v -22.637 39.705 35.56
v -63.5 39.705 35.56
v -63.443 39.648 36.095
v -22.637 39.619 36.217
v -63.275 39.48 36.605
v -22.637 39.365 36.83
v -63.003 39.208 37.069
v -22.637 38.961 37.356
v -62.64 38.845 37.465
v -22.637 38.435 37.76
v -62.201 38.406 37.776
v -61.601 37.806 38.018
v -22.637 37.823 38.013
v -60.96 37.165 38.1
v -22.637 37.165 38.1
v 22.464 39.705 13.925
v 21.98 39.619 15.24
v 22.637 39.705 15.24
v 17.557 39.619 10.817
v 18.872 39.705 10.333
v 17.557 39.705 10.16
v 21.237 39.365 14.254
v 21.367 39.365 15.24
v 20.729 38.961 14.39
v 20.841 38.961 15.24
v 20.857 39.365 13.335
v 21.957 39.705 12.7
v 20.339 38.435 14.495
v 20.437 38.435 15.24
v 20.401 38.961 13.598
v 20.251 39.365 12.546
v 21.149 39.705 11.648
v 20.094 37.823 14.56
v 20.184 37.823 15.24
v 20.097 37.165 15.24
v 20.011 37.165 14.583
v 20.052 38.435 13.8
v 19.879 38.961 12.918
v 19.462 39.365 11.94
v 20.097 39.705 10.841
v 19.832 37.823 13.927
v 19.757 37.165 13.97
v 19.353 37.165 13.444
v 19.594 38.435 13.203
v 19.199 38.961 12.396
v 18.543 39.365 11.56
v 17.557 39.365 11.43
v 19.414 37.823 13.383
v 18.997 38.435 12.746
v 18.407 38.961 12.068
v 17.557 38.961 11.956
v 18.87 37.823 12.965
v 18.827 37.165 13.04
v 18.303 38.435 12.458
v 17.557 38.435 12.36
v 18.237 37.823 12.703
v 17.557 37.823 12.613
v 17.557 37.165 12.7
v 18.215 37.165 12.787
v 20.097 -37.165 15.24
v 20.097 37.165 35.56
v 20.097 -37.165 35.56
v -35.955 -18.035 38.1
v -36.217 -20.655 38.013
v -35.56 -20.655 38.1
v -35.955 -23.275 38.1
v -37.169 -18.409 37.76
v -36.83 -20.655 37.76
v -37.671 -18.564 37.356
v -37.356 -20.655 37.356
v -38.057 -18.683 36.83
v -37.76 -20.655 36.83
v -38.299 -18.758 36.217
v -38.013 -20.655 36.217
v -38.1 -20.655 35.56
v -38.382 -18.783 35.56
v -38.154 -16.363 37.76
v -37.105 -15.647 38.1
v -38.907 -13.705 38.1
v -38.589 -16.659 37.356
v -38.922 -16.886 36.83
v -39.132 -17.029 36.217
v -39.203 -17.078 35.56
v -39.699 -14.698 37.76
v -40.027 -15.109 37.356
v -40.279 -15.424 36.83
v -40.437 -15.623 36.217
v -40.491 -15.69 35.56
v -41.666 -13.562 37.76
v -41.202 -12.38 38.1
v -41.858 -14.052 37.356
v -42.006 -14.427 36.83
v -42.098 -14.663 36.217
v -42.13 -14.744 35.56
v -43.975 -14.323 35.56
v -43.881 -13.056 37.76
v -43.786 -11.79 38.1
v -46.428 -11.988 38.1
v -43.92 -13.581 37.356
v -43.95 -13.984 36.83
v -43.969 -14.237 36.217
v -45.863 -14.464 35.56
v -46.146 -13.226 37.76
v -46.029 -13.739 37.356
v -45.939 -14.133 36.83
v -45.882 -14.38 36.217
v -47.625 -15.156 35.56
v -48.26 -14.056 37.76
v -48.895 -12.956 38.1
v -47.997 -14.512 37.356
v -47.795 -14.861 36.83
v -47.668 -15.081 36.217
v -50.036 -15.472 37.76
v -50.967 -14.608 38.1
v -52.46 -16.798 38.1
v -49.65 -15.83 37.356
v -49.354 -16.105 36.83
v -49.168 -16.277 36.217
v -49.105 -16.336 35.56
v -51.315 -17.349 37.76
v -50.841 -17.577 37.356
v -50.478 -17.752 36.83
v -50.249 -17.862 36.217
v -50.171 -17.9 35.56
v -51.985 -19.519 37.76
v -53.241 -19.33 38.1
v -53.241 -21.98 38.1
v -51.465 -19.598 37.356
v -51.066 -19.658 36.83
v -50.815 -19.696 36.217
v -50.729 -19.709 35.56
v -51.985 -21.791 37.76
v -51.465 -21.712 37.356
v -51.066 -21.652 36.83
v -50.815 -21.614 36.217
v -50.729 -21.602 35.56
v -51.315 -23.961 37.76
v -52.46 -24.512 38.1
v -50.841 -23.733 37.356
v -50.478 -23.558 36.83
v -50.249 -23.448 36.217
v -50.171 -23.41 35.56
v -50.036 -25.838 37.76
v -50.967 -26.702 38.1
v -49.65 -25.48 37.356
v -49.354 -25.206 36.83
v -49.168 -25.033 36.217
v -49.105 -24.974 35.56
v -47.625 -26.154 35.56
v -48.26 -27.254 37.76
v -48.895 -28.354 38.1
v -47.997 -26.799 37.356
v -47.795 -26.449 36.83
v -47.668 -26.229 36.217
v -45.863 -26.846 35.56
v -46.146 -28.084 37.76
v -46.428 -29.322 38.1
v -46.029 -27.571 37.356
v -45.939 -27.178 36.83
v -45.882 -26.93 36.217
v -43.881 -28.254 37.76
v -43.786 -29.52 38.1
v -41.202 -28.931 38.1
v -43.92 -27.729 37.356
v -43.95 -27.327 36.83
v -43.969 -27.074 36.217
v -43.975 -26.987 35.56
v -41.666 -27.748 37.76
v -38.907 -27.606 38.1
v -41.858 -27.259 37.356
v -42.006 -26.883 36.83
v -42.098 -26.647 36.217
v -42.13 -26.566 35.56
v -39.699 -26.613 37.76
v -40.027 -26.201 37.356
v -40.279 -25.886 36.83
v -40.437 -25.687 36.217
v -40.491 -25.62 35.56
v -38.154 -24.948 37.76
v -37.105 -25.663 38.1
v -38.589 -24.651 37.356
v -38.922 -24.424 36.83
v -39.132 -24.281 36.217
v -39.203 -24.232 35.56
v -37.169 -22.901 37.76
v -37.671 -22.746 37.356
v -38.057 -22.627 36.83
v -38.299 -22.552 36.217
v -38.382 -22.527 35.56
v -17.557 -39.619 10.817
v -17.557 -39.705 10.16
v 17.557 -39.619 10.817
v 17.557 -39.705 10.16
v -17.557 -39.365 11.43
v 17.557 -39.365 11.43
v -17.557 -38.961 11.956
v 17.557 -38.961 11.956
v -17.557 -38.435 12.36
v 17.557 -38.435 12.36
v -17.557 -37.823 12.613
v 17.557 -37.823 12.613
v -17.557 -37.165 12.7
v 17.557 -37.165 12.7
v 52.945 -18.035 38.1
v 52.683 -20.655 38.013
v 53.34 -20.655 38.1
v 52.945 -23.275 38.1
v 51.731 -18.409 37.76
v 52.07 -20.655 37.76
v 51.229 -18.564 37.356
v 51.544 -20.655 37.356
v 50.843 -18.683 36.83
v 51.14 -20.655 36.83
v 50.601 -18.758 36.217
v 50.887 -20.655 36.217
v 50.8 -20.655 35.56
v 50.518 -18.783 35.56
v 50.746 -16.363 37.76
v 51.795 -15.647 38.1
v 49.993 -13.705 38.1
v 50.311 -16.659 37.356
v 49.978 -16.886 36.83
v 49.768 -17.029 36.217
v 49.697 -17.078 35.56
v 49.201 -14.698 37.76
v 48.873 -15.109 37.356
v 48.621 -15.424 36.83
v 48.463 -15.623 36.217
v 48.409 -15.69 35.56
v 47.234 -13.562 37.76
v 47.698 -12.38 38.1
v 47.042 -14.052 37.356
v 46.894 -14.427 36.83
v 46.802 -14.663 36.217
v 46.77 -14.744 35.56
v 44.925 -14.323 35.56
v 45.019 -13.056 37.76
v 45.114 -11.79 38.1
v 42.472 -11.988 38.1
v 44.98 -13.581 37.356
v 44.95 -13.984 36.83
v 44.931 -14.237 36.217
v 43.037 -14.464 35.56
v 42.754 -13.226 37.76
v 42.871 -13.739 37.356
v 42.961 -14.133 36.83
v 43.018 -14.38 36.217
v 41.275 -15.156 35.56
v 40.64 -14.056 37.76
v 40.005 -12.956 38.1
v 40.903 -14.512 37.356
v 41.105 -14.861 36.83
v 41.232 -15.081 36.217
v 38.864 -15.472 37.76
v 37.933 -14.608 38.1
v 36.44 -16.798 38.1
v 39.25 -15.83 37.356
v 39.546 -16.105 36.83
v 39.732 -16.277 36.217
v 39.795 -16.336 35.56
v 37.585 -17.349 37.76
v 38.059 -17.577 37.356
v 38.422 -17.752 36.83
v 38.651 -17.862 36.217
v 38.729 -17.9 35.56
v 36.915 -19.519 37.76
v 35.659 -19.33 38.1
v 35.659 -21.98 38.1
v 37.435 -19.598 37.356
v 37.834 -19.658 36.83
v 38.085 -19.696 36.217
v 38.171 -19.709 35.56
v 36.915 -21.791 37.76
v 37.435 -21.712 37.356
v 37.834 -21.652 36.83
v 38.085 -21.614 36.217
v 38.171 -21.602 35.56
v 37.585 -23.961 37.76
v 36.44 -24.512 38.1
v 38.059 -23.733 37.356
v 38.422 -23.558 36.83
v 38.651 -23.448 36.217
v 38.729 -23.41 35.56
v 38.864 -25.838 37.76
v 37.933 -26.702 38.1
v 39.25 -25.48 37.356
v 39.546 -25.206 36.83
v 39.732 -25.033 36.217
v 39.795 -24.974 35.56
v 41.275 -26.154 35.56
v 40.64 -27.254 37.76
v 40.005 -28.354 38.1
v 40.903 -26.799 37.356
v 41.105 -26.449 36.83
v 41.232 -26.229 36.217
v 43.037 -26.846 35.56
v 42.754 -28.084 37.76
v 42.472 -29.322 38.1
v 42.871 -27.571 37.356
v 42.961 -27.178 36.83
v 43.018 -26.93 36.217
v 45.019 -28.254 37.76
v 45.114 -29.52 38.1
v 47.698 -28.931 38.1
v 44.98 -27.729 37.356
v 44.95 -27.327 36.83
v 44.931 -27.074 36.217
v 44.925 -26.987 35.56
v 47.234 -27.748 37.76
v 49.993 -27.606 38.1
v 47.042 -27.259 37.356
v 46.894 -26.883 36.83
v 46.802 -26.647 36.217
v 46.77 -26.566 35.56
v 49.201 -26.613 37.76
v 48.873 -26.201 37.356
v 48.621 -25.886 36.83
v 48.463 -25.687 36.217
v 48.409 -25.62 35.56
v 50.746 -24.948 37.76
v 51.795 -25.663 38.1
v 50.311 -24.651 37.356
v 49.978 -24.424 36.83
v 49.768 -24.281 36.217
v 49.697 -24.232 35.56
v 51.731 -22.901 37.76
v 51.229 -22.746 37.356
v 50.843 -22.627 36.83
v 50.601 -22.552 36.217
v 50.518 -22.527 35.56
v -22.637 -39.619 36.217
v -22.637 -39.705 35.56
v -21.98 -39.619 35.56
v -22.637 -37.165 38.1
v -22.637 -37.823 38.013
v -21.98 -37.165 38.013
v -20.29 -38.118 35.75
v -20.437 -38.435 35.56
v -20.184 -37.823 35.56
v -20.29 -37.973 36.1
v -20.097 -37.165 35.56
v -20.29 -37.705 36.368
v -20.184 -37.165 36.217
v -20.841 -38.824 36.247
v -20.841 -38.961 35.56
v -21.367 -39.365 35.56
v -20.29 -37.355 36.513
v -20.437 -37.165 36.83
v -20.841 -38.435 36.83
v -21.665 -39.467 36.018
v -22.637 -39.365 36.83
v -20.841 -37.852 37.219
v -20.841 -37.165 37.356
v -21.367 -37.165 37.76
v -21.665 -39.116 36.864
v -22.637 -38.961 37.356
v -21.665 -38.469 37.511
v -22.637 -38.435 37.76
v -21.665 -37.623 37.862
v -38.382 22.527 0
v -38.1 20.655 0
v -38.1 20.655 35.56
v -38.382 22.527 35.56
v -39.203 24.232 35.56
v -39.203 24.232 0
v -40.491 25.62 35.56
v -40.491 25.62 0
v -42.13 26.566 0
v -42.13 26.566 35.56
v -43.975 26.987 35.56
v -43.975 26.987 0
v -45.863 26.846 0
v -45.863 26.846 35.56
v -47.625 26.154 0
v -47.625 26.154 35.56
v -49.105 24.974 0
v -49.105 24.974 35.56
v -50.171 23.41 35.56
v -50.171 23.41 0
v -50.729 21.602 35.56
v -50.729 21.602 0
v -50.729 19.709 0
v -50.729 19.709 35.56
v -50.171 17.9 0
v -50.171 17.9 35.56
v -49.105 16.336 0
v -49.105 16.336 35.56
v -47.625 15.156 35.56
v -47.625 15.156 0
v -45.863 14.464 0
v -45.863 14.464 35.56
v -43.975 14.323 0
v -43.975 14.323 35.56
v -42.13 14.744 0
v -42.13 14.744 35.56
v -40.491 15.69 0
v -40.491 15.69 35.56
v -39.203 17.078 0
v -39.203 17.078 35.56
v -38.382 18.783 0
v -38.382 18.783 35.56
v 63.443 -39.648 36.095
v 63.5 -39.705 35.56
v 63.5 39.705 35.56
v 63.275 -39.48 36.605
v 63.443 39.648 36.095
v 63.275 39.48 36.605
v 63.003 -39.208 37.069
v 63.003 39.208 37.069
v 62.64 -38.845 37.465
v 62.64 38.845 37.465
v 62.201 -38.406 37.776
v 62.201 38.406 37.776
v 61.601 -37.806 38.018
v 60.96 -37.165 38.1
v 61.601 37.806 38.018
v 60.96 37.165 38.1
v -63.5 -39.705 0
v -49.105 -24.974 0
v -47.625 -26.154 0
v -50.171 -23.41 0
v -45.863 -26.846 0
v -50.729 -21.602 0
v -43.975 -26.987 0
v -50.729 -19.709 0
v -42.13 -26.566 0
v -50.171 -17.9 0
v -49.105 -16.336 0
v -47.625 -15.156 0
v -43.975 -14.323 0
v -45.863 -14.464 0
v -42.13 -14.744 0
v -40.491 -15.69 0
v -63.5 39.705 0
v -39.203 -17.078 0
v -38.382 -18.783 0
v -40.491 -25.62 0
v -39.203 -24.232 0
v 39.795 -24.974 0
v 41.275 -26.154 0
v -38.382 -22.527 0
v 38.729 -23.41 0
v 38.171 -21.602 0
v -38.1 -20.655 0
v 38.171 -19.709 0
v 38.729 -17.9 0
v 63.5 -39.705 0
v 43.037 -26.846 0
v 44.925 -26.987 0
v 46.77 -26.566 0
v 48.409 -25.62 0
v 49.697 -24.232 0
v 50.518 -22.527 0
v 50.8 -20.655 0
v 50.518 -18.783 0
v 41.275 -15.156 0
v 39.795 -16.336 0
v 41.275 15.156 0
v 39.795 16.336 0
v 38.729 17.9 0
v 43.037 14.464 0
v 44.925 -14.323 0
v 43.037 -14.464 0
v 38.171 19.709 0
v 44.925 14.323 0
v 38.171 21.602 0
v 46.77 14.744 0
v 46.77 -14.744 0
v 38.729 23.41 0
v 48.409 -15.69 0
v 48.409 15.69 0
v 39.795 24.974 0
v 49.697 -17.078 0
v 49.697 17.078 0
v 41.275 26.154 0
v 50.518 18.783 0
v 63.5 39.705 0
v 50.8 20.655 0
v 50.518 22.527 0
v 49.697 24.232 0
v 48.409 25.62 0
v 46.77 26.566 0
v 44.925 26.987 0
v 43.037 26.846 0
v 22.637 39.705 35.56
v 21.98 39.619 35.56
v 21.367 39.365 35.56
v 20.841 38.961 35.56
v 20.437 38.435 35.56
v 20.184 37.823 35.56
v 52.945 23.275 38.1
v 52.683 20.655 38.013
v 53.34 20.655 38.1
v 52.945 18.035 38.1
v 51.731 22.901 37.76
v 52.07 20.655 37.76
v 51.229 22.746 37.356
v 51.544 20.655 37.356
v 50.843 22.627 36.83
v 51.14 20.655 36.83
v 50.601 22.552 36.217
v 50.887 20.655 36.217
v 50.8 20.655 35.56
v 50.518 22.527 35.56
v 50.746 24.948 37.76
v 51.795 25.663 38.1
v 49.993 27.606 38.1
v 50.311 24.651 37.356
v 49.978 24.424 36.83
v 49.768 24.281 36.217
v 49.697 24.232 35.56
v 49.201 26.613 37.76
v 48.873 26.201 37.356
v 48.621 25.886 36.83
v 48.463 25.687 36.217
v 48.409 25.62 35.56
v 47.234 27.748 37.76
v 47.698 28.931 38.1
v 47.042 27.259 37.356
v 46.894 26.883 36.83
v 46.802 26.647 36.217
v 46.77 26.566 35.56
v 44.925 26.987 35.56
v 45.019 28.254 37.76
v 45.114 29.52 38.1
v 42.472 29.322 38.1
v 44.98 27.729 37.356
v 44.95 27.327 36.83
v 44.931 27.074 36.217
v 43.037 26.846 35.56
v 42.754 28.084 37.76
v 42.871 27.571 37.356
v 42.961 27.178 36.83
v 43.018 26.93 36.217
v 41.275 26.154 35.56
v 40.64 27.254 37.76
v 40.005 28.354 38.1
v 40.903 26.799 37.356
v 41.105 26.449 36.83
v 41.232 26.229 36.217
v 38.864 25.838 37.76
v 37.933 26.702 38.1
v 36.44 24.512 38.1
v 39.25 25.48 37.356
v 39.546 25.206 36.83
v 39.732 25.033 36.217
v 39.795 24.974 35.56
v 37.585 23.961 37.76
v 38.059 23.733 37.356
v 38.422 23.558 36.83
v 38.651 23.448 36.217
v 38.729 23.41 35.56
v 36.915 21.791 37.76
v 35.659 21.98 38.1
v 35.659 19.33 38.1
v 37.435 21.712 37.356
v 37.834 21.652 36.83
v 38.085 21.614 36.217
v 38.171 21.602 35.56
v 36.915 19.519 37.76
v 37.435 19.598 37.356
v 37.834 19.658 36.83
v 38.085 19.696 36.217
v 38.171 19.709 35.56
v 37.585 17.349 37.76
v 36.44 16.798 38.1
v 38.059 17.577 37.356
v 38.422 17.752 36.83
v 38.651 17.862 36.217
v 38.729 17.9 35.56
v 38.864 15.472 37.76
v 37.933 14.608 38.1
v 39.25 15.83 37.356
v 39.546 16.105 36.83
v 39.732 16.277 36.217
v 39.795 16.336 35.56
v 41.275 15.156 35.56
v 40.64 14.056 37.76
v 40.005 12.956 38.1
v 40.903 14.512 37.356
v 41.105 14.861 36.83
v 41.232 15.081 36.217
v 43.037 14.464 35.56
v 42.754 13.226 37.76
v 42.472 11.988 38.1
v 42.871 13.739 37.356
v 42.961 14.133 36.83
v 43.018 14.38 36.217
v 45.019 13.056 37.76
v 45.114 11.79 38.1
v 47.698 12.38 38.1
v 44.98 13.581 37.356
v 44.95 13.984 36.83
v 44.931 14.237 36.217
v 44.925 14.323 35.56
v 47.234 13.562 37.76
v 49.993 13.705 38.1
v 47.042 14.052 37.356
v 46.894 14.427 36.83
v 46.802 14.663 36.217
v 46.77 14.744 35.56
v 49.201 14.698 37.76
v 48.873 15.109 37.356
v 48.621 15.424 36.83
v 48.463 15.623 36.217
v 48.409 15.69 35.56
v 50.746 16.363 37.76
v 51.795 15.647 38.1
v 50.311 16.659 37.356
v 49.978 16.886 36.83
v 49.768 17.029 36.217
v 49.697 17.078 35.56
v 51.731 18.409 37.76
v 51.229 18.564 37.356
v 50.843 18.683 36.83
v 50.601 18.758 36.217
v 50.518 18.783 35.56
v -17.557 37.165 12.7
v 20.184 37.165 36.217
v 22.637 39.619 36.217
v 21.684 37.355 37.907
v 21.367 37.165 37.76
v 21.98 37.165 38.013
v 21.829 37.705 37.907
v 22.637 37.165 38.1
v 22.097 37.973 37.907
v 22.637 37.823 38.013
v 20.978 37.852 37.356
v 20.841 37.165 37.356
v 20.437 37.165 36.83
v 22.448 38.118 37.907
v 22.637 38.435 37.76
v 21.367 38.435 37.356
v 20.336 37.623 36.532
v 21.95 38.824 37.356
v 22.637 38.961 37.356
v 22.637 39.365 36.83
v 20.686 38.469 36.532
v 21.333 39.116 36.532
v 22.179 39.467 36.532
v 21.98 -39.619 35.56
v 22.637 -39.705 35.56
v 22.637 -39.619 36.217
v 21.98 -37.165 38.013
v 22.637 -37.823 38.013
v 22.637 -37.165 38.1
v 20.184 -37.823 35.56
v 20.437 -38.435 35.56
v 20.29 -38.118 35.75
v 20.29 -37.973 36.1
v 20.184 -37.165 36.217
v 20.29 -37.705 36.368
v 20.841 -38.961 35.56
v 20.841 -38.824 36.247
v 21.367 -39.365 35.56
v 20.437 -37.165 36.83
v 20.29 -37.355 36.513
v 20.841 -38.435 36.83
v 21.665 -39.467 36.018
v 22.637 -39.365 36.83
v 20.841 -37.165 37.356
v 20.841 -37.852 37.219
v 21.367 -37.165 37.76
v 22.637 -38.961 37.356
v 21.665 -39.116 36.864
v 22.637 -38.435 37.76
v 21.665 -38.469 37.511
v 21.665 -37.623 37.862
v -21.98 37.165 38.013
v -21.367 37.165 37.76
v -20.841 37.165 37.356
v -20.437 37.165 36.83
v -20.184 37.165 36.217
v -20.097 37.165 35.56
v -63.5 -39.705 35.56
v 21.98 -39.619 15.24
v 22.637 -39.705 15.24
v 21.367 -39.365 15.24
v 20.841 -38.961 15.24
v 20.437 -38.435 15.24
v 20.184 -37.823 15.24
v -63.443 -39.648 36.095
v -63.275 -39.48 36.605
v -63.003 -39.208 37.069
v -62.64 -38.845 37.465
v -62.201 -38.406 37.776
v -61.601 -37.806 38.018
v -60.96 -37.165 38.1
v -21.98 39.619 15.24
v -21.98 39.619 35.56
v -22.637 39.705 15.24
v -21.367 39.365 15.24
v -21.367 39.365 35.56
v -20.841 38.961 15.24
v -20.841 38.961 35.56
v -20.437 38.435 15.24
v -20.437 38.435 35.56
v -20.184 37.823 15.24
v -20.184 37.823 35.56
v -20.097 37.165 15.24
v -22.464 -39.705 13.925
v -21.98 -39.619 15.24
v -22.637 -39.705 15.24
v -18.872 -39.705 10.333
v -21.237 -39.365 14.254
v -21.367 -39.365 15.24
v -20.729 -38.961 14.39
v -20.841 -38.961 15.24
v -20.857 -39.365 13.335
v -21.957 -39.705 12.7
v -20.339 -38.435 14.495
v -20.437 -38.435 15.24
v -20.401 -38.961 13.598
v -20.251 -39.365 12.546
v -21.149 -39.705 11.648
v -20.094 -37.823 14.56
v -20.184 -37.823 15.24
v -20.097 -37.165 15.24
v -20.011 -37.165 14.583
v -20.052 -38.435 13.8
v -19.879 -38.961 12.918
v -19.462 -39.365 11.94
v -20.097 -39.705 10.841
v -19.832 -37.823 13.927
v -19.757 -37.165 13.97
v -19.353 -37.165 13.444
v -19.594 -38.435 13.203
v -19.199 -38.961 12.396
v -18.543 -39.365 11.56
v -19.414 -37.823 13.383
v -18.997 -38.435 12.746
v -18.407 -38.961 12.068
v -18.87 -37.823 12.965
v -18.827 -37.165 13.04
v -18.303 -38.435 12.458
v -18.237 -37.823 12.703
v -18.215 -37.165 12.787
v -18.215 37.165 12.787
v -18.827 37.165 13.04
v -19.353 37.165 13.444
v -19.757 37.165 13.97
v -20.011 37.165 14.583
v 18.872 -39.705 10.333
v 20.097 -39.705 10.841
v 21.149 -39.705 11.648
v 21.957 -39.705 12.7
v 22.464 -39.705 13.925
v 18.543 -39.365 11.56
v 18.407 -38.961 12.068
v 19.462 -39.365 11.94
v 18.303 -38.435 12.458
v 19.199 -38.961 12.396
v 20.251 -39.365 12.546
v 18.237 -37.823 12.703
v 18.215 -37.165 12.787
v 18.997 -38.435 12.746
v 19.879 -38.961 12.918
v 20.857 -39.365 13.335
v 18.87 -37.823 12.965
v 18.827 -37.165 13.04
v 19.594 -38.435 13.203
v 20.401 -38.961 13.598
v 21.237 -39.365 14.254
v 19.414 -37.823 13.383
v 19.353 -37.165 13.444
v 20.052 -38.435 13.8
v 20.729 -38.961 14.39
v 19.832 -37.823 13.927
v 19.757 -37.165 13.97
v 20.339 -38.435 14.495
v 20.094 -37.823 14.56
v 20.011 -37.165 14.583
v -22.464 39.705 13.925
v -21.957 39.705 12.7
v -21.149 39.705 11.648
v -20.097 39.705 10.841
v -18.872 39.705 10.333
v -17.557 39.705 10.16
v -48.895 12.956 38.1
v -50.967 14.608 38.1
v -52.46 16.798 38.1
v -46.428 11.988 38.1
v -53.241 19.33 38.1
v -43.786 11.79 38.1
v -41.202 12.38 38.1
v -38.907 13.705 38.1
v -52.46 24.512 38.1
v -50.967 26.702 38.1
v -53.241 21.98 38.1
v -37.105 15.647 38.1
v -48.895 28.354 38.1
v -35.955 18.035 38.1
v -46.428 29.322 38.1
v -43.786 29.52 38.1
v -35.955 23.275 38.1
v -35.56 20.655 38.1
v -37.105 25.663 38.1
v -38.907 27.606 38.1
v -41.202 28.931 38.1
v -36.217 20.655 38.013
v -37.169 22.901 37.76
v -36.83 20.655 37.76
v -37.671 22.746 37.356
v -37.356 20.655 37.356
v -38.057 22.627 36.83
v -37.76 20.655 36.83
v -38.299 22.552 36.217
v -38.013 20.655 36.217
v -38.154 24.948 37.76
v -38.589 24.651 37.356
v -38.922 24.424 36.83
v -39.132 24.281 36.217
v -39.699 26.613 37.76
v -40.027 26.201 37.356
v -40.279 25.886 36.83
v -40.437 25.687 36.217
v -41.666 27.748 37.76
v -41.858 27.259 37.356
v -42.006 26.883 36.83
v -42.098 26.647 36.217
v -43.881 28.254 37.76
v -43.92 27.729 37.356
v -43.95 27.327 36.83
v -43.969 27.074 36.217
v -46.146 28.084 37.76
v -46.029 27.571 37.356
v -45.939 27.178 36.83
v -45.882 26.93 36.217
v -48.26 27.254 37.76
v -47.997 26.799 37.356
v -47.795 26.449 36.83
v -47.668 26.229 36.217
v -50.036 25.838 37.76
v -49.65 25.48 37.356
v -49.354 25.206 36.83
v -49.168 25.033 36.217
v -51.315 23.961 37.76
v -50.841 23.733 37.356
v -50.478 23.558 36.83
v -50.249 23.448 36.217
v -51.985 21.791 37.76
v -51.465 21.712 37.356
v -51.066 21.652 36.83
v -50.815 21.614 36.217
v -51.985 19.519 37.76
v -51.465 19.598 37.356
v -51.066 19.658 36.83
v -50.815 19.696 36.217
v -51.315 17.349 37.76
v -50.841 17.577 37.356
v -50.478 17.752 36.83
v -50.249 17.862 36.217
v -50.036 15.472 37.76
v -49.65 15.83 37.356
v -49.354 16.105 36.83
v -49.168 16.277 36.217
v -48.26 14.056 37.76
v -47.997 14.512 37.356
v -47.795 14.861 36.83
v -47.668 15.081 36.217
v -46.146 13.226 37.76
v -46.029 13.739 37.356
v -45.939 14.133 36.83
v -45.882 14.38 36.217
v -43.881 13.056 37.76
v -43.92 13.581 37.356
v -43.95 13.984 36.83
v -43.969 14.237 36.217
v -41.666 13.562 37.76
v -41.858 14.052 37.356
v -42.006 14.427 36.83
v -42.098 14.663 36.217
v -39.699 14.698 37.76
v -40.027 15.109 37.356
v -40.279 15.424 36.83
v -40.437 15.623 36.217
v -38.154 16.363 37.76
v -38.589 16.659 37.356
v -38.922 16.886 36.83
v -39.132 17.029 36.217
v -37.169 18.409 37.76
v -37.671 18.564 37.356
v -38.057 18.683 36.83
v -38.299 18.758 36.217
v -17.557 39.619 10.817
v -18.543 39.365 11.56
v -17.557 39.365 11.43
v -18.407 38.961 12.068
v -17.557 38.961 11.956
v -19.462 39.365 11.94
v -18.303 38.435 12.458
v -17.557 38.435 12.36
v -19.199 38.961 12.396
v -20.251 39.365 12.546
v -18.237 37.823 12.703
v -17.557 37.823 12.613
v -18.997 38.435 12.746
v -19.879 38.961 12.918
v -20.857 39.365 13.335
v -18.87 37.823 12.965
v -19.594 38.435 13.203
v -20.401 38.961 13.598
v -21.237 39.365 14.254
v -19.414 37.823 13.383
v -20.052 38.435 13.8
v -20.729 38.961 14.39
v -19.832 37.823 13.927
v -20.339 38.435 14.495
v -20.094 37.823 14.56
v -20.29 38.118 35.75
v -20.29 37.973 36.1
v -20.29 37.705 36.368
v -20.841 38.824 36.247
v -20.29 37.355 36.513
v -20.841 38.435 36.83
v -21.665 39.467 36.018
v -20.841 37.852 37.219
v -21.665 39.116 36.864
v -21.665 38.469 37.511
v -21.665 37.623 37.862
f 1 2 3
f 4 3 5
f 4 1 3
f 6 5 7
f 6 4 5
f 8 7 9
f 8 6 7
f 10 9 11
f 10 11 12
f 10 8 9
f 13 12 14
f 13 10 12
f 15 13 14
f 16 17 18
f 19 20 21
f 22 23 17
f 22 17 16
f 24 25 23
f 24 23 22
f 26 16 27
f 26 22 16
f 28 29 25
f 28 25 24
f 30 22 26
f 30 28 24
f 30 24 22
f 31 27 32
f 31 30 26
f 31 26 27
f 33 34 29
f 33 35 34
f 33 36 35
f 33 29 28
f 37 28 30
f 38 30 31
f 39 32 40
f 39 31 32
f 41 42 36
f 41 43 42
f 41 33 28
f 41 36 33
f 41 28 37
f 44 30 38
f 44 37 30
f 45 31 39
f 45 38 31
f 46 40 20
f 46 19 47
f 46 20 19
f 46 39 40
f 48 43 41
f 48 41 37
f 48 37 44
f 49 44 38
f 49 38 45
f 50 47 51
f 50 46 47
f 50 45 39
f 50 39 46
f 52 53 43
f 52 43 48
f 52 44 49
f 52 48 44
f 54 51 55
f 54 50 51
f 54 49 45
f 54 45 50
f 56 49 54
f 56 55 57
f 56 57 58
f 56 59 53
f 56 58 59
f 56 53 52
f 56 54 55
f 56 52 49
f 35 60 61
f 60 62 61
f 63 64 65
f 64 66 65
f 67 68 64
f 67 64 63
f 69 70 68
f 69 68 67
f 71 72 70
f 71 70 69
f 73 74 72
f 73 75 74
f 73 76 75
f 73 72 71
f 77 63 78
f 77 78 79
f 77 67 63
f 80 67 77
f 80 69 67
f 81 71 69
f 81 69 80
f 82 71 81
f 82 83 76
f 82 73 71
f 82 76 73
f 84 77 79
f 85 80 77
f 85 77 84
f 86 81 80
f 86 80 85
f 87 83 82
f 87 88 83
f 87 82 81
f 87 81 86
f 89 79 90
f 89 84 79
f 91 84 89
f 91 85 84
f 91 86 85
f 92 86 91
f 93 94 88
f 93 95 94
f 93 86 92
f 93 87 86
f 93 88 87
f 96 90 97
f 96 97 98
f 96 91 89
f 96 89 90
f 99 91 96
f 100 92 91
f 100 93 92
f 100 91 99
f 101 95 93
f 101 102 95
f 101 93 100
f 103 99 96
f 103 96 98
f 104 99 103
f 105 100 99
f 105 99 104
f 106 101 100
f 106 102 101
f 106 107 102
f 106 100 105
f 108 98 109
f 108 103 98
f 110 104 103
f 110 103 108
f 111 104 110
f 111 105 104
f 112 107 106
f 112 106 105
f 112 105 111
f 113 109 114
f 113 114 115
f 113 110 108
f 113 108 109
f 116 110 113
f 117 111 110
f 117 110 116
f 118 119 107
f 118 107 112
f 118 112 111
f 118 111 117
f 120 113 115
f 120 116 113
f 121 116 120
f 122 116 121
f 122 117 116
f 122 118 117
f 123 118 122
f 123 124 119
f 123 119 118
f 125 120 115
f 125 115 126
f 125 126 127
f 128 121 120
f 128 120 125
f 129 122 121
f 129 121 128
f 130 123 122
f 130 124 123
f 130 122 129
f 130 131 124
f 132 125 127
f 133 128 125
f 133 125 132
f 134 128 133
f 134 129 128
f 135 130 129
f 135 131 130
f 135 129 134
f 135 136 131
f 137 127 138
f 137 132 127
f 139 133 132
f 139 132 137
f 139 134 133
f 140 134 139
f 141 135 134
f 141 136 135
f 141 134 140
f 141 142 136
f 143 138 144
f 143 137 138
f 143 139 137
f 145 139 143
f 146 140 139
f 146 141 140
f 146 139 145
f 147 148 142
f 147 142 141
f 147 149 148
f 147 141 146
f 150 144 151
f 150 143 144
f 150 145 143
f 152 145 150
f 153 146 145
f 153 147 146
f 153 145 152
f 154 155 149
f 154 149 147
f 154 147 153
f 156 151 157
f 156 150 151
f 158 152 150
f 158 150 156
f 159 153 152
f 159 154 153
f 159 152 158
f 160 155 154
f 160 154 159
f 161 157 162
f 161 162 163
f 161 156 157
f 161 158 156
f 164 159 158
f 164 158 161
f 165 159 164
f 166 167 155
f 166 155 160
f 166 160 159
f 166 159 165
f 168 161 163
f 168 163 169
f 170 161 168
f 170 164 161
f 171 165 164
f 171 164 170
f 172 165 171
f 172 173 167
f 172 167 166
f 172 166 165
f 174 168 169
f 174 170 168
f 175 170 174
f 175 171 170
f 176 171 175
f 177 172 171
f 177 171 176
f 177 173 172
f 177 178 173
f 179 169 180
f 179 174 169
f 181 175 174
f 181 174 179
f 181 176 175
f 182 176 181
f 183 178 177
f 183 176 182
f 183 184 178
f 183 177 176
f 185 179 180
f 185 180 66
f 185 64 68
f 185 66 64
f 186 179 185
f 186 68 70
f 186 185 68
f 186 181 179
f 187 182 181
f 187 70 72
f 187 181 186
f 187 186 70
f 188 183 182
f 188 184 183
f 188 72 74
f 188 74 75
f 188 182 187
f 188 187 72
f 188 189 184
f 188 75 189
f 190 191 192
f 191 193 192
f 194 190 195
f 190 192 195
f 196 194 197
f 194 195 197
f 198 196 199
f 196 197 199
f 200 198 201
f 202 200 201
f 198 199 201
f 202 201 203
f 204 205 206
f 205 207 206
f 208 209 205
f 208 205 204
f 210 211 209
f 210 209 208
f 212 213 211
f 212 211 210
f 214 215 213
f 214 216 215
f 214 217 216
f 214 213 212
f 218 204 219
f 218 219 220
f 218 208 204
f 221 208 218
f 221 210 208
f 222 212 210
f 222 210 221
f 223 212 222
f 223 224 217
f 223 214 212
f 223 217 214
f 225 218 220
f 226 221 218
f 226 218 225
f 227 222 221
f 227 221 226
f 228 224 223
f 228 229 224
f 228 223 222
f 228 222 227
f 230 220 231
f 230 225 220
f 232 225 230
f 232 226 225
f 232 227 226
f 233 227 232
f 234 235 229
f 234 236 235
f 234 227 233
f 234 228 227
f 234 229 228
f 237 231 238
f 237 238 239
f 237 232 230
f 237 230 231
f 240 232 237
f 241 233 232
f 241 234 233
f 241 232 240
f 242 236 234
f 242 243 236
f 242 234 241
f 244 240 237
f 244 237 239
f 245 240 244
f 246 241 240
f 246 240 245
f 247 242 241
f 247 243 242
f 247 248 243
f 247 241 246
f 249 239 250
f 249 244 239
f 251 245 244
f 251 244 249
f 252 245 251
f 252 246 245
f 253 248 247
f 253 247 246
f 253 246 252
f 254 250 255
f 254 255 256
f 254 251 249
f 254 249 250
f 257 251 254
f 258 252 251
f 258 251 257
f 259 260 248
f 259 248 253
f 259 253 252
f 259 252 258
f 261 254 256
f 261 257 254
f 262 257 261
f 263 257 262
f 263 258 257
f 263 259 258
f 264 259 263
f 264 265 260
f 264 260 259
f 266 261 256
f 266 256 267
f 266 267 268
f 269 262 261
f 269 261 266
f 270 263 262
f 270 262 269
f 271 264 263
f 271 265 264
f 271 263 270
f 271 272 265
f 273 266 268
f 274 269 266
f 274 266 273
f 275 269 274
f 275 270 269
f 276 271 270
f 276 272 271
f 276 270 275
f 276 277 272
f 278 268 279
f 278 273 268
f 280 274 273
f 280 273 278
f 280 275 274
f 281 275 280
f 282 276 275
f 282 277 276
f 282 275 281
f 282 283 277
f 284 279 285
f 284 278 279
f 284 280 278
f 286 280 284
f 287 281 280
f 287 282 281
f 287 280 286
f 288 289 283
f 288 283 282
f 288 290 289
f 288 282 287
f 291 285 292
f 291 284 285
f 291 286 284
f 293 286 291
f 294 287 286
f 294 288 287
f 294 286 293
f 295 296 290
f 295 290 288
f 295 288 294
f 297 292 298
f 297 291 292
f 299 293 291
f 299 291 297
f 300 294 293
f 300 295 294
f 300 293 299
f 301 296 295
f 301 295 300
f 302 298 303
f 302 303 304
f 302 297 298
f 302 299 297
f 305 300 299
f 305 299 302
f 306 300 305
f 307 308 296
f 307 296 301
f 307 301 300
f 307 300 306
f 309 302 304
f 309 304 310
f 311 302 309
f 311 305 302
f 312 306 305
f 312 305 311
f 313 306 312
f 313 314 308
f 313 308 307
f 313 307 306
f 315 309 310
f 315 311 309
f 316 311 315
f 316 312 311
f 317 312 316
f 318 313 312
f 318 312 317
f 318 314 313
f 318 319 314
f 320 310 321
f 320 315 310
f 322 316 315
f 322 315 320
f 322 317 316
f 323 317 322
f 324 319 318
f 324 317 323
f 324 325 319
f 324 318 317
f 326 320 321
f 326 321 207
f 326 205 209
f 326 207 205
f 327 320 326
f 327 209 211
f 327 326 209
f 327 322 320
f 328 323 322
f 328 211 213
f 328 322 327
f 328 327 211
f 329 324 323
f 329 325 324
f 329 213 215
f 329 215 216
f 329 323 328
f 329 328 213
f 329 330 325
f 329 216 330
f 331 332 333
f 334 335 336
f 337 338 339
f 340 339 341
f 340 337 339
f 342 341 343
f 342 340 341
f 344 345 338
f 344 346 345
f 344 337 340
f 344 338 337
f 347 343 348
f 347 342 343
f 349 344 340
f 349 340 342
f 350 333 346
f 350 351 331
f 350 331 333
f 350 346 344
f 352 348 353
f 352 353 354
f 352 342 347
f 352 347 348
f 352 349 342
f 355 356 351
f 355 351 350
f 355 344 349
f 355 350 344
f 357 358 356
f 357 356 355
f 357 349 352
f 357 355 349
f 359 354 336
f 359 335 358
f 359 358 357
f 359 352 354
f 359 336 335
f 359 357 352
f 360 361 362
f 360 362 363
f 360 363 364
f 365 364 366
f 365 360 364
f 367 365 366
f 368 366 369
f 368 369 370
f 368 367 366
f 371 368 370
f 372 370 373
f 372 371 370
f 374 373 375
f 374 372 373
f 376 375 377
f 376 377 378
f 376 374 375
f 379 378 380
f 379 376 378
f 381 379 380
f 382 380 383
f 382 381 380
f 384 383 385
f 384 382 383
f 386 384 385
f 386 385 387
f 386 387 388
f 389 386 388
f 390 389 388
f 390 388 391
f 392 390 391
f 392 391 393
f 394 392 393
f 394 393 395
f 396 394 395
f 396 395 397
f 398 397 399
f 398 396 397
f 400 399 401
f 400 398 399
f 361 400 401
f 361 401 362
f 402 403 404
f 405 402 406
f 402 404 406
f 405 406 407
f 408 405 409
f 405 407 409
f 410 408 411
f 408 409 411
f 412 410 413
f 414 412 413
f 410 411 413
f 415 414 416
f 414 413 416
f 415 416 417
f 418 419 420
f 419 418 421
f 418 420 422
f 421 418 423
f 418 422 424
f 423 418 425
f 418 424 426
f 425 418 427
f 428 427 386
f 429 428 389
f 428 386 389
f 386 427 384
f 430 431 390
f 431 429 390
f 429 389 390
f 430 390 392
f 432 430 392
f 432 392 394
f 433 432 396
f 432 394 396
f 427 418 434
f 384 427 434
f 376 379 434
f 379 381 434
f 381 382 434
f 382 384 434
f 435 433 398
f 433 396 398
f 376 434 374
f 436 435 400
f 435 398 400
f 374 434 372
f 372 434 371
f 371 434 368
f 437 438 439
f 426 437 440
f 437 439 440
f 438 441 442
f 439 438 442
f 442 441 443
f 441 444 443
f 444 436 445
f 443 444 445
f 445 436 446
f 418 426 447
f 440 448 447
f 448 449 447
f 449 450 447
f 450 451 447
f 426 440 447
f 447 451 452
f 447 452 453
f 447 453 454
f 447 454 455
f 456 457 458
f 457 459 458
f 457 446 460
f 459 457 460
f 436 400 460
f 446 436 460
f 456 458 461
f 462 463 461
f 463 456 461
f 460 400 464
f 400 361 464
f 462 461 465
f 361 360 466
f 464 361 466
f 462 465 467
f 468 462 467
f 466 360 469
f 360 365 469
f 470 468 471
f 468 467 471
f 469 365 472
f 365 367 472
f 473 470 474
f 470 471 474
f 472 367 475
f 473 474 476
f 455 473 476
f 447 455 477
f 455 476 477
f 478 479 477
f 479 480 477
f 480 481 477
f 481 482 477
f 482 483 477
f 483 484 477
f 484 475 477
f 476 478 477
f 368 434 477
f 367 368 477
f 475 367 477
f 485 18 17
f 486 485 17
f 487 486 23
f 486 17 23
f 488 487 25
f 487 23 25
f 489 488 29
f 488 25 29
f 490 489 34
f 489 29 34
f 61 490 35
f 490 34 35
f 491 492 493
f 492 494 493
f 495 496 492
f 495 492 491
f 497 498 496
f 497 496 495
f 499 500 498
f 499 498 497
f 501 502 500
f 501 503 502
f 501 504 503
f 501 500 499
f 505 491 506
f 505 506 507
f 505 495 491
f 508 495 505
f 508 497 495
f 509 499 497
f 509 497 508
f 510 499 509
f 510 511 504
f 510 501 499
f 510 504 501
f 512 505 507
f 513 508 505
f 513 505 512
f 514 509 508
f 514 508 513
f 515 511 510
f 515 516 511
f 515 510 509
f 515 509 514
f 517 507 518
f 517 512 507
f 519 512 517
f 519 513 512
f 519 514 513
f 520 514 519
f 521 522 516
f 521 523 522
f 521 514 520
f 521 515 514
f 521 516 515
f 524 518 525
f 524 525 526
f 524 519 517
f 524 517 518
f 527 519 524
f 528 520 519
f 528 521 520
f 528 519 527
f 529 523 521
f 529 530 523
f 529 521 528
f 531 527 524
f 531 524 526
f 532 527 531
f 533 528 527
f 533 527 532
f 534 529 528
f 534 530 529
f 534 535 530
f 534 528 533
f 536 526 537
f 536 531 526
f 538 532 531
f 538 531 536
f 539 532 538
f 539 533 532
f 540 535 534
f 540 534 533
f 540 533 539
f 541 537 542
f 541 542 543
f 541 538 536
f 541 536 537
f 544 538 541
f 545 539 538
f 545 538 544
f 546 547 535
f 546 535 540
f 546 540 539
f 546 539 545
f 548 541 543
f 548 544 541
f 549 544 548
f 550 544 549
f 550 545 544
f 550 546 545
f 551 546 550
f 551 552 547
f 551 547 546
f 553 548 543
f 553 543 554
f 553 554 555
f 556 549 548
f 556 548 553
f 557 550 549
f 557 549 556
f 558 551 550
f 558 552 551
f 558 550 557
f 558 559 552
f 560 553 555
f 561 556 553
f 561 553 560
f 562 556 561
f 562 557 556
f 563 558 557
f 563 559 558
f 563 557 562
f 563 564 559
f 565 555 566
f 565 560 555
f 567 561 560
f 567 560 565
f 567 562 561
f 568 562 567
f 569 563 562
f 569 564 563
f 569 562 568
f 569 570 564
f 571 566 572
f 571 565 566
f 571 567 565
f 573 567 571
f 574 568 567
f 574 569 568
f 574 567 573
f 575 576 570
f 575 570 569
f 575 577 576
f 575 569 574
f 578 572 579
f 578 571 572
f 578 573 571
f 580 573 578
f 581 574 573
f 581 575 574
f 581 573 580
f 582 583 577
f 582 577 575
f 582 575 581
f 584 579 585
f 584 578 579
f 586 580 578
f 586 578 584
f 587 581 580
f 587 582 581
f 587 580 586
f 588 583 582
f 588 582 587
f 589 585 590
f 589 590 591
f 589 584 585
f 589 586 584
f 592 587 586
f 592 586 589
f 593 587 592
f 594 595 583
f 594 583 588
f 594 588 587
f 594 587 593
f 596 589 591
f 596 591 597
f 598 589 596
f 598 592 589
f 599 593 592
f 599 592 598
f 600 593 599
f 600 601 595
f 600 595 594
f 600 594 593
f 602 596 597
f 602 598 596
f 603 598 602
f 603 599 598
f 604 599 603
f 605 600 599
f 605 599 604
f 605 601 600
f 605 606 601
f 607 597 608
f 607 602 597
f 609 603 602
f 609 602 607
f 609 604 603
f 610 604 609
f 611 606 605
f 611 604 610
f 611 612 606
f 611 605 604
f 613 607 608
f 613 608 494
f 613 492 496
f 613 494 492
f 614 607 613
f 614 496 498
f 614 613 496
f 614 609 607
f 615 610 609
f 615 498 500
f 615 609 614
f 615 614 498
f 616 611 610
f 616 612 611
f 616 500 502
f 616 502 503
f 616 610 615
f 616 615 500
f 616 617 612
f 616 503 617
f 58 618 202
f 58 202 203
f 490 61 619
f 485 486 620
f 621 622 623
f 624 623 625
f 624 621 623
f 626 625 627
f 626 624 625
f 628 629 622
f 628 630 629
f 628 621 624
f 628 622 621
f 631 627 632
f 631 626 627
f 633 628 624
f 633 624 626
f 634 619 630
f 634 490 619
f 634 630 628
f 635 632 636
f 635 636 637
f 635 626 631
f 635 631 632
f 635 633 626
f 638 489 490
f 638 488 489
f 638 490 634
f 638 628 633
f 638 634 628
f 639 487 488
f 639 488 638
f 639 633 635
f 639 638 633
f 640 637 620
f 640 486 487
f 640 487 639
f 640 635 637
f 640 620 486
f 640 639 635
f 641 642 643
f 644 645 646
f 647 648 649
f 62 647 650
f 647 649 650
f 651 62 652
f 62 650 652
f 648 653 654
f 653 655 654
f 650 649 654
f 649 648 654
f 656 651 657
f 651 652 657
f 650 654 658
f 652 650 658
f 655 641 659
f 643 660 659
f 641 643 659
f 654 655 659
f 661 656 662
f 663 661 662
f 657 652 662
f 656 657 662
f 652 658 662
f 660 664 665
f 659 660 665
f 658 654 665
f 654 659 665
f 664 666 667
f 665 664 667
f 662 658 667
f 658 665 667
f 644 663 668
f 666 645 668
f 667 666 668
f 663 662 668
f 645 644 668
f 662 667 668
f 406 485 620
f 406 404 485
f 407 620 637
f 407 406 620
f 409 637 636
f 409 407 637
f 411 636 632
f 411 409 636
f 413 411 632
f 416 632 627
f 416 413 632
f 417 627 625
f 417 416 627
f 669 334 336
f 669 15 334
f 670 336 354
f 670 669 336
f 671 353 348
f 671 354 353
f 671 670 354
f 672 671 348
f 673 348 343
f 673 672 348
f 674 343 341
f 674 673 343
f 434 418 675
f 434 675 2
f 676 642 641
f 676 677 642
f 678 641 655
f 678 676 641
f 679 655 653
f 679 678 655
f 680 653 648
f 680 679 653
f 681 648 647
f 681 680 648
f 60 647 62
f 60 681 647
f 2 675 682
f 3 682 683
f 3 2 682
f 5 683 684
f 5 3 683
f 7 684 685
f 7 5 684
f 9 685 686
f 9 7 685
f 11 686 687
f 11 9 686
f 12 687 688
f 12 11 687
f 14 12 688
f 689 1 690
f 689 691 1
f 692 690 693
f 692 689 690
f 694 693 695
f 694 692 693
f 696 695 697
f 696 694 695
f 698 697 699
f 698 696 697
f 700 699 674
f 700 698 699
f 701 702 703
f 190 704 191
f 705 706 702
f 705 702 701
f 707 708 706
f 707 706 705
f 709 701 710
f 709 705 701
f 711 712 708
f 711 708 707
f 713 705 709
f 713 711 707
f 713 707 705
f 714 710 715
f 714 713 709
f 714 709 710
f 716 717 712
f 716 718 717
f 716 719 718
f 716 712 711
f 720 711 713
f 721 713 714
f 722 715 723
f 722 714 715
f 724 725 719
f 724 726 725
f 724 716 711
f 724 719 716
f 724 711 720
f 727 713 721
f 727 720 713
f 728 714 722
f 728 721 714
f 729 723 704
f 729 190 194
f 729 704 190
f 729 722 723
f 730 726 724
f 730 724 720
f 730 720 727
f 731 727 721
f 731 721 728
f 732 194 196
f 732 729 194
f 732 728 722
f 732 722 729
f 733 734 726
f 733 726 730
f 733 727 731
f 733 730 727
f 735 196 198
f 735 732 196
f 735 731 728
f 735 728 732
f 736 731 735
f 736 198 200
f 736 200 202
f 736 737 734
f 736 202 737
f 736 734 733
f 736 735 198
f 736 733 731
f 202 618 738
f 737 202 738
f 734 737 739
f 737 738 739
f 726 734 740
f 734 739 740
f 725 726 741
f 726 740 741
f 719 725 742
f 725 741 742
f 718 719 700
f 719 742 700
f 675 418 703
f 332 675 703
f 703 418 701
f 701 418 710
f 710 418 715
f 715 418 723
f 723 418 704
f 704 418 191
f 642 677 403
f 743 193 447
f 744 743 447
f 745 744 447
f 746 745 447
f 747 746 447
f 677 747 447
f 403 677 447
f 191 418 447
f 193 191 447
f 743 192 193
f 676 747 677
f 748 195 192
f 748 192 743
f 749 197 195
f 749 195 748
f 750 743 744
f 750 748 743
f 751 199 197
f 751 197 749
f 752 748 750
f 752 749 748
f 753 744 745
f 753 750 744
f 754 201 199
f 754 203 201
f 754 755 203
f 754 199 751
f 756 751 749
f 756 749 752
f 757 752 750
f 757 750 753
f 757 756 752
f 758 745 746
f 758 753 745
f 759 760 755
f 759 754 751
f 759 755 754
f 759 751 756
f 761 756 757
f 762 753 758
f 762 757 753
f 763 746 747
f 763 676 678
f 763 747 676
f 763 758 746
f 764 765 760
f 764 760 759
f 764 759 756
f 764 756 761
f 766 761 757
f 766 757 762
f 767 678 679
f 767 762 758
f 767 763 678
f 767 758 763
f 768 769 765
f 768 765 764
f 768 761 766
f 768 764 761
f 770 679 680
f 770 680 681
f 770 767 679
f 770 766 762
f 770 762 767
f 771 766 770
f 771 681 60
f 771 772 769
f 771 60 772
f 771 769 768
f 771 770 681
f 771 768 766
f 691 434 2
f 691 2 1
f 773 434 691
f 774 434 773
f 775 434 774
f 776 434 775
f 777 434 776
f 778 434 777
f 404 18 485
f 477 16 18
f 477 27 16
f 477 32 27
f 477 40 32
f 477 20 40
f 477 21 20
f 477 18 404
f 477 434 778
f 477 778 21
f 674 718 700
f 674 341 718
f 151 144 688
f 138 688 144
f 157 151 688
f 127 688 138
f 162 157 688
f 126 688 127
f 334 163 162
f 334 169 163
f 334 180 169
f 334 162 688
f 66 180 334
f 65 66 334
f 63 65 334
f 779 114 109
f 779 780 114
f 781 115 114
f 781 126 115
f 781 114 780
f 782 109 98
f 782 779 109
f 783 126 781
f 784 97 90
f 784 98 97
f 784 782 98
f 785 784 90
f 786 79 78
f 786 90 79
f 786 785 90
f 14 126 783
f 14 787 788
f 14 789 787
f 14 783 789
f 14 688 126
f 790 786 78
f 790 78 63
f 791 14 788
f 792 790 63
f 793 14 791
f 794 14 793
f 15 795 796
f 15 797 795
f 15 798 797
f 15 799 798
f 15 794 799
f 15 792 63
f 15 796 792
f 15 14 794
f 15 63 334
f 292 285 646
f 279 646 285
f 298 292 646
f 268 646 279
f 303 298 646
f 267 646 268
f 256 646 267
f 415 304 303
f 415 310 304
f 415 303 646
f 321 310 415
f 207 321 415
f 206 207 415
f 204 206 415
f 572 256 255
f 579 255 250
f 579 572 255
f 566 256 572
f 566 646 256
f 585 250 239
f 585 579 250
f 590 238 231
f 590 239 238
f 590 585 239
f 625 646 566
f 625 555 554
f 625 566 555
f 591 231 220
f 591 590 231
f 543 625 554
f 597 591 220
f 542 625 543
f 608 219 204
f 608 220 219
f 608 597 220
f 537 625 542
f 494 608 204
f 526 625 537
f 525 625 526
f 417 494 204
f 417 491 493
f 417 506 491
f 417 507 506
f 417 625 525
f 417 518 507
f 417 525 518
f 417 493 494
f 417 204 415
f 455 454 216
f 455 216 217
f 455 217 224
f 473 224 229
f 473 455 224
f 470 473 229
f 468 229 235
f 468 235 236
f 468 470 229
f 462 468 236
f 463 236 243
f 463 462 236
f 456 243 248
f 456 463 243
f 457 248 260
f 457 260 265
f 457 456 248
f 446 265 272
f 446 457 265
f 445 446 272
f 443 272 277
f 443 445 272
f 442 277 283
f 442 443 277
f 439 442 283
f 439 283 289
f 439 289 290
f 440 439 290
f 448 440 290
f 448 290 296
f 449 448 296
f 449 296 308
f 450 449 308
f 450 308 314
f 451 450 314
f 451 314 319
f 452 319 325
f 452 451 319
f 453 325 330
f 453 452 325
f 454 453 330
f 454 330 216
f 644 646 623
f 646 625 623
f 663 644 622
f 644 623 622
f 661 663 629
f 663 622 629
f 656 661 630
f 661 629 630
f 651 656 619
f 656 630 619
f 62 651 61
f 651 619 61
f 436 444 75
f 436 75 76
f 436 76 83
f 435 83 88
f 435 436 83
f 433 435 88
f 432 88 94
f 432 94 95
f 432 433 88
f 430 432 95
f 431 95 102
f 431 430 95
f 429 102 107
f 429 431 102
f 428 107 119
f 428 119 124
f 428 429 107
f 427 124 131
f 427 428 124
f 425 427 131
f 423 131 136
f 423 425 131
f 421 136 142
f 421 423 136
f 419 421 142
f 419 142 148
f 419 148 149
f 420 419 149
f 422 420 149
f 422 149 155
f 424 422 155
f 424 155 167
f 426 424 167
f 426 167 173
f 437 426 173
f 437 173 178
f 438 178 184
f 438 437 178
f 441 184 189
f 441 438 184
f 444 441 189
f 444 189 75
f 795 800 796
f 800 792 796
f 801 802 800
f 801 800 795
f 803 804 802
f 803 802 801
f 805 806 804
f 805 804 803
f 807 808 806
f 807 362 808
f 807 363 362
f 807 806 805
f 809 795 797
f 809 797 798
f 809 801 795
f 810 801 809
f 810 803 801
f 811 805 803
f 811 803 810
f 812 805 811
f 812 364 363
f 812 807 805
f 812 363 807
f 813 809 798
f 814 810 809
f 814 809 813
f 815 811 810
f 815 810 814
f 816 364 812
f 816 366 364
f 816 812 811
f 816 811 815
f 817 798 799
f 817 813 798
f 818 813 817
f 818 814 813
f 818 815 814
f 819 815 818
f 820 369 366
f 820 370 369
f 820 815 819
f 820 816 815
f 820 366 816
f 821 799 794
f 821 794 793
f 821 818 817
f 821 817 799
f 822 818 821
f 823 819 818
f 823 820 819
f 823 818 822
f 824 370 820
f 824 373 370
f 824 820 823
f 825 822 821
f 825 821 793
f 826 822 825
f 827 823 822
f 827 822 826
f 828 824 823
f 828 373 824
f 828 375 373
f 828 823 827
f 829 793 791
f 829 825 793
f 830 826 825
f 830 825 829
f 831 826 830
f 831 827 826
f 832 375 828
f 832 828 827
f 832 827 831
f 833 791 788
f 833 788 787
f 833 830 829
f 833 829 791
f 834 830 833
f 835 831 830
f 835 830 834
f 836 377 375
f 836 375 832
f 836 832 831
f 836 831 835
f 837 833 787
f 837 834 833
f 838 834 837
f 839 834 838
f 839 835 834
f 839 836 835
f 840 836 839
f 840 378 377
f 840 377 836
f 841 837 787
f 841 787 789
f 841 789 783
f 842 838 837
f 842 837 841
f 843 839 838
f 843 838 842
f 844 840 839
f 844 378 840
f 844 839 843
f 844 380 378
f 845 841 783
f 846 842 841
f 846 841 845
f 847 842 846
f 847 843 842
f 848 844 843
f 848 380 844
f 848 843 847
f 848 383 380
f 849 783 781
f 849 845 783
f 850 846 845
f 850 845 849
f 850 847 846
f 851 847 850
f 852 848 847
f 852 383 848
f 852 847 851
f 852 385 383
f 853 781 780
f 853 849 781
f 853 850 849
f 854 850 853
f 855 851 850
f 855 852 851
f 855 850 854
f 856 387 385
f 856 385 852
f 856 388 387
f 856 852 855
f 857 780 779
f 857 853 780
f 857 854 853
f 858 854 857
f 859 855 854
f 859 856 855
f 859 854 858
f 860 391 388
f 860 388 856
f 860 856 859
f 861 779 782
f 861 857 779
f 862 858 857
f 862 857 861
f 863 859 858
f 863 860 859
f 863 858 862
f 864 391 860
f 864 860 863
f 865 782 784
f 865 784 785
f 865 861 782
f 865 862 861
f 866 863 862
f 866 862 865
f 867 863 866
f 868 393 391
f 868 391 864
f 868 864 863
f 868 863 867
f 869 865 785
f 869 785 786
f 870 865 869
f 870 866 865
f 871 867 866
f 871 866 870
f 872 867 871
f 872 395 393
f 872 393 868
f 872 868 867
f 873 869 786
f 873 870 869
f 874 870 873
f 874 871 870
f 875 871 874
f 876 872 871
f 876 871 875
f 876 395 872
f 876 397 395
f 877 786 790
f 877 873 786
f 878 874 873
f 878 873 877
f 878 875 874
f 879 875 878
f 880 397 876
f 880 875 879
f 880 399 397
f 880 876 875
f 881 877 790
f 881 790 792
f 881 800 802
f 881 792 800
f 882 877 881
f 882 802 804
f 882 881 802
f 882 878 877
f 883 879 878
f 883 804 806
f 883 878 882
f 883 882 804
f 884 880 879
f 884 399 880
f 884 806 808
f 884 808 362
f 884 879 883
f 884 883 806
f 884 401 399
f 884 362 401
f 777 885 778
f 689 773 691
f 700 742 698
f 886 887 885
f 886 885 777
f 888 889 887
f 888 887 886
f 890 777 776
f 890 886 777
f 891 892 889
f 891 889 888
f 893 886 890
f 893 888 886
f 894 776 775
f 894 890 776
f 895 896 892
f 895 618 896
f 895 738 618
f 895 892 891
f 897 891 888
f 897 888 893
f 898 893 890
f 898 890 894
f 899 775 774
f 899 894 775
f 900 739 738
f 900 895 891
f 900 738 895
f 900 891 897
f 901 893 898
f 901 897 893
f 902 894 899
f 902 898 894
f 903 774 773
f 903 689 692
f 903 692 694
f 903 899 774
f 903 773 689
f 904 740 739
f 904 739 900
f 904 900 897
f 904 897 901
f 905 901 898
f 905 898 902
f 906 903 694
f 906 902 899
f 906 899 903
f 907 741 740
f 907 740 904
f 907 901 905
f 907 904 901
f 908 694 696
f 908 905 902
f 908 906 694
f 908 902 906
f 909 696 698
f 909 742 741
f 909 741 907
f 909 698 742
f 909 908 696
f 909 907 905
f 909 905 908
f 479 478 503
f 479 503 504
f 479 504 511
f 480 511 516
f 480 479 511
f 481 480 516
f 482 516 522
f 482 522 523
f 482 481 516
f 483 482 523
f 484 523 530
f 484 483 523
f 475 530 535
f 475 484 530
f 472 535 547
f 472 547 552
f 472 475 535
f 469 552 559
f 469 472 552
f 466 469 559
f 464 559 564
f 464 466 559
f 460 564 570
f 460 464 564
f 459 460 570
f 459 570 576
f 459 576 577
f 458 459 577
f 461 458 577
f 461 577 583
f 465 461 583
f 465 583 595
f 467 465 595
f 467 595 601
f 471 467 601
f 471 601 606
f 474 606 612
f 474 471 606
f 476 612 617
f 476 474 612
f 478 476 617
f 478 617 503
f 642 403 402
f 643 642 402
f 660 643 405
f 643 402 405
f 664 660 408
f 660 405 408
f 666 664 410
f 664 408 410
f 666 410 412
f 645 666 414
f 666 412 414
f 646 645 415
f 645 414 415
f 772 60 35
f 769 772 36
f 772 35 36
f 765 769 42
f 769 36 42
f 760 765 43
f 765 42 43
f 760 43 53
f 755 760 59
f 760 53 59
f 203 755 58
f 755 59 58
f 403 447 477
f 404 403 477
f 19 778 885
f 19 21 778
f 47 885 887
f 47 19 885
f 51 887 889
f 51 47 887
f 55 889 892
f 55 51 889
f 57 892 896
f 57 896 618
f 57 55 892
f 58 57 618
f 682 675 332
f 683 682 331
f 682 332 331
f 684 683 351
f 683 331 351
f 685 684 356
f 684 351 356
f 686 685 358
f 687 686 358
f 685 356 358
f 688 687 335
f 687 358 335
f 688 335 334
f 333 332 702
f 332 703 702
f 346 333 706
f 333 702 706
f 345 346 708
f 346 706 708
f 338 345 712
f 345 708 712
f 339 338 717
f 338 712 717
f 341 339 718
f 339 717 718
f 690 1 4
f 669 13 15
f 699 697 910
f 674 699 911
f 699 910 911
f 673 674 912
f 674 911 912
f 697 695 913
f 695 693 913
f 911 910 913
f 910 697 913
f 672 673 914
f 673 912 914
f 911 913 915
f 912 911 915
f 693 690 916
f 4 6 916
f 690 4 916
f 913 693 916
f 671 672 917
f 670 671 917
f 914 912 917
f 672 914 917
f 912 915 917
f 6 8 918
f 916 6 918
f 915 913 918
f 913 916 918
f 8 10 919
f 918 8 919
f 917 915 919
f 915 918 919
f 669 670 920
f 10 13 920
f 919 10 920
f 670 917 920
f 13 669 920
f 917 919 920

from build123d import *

# Parameters (mm, degrees)
SKETCH1_W           = 127
SKETCH1_H           = 79.410199556
SKETCH1_R           = 6.35
BOSS_EXTRUDE1_DEPTH = 38.1
SKETCH3_W           = 40.194306858
SKETCH3_H           = 79.410199556
CUT_EXTRUDE1_DEPTH  = 25.4
FILLET1_R           = 2.54
FILLET2_R           = 2.54


with BuildPart() as part:
    # Sketch1 → Boss-Extrude1 (new body)
    with BuildSketch(Plane.XY):
        Rectangle(SKETCH1_W, SKETCH1_H)
        with Locations((-44.45, 20.655099778)):
            Circle(SKETCH1_R, mode=Mode.SUBTRACT)
        with Locations((44.45, 20.655099778)):
            Circle(SKETCH1_R, mode=Mode.SUBTRACT)
        with Locations((44.45, -20.655099778)):
            Circle(SKETCH1_R, mode=Mode.SUBTRACT)
        with Locations((-44.45, -20.655099778)):
            Circle(SKETCH1_R, mode=Mode.SUBTRACT)
    extrude(amount=BOSS_EXTRUDE1_DEPTH)

    # Sketch3 → Cut-Extrude1 (cut)
    with BuildSketch(Plane.XY.offset(38.1)):
        Rectangle(SKETCH3_W, SKETCH3_H)
    extrude(amount=-CUT_EXTRUDE1_DEPTH, mode=Mode.SUBTRACT)

    # Fillet1
    fillet1_edges = [part.edges().sort_by_distance(p)[0] for p in [
        (-63.5, 0, 38.1),
        (38.1, 20.655099778, 38.1),
        (-41.798576715, -39.705099778, 38.1),
        (38.1, -20.655099778, 38.1),
        (41.798576715, -39.705099778, 38.1),
        (-41.798576715, 39.705099778, 38.1),
        (20.097153429, 0, 12.7),
        (20.097153429, 39.705099778, 25.4),
        (0, -39.705099778, 12.7),
        (20.097153429, -39.705099778, 25.4),
        (-20.097153429, 0, 12.7),
        (-20.097153429, -39.705099778, 25.4),
        (0, 39.705099778, 12.7),
        (-20.097153429, 39.705099778, 25.4),
        (20.097153429, 0, 38.1),
        (-20.097153429, 0, 38.1),
        (63.5, 0, 38.1),
        (41.798576715, 39.705099778, 38.1),
    ]]
    fillet(fillet1_edges, radius=FILLET1_R)

    # Fillet2
    fillet2_edges = [part.edges().sort_by_distance(p)[0] for p in [
        (-50.8, 20.655099778, 38.1),
        (-50.8, -20.655099778, 38.1),
    ]]
    fillet(fillet2_edges, radius=FILLET2_R)


solid = part.part
